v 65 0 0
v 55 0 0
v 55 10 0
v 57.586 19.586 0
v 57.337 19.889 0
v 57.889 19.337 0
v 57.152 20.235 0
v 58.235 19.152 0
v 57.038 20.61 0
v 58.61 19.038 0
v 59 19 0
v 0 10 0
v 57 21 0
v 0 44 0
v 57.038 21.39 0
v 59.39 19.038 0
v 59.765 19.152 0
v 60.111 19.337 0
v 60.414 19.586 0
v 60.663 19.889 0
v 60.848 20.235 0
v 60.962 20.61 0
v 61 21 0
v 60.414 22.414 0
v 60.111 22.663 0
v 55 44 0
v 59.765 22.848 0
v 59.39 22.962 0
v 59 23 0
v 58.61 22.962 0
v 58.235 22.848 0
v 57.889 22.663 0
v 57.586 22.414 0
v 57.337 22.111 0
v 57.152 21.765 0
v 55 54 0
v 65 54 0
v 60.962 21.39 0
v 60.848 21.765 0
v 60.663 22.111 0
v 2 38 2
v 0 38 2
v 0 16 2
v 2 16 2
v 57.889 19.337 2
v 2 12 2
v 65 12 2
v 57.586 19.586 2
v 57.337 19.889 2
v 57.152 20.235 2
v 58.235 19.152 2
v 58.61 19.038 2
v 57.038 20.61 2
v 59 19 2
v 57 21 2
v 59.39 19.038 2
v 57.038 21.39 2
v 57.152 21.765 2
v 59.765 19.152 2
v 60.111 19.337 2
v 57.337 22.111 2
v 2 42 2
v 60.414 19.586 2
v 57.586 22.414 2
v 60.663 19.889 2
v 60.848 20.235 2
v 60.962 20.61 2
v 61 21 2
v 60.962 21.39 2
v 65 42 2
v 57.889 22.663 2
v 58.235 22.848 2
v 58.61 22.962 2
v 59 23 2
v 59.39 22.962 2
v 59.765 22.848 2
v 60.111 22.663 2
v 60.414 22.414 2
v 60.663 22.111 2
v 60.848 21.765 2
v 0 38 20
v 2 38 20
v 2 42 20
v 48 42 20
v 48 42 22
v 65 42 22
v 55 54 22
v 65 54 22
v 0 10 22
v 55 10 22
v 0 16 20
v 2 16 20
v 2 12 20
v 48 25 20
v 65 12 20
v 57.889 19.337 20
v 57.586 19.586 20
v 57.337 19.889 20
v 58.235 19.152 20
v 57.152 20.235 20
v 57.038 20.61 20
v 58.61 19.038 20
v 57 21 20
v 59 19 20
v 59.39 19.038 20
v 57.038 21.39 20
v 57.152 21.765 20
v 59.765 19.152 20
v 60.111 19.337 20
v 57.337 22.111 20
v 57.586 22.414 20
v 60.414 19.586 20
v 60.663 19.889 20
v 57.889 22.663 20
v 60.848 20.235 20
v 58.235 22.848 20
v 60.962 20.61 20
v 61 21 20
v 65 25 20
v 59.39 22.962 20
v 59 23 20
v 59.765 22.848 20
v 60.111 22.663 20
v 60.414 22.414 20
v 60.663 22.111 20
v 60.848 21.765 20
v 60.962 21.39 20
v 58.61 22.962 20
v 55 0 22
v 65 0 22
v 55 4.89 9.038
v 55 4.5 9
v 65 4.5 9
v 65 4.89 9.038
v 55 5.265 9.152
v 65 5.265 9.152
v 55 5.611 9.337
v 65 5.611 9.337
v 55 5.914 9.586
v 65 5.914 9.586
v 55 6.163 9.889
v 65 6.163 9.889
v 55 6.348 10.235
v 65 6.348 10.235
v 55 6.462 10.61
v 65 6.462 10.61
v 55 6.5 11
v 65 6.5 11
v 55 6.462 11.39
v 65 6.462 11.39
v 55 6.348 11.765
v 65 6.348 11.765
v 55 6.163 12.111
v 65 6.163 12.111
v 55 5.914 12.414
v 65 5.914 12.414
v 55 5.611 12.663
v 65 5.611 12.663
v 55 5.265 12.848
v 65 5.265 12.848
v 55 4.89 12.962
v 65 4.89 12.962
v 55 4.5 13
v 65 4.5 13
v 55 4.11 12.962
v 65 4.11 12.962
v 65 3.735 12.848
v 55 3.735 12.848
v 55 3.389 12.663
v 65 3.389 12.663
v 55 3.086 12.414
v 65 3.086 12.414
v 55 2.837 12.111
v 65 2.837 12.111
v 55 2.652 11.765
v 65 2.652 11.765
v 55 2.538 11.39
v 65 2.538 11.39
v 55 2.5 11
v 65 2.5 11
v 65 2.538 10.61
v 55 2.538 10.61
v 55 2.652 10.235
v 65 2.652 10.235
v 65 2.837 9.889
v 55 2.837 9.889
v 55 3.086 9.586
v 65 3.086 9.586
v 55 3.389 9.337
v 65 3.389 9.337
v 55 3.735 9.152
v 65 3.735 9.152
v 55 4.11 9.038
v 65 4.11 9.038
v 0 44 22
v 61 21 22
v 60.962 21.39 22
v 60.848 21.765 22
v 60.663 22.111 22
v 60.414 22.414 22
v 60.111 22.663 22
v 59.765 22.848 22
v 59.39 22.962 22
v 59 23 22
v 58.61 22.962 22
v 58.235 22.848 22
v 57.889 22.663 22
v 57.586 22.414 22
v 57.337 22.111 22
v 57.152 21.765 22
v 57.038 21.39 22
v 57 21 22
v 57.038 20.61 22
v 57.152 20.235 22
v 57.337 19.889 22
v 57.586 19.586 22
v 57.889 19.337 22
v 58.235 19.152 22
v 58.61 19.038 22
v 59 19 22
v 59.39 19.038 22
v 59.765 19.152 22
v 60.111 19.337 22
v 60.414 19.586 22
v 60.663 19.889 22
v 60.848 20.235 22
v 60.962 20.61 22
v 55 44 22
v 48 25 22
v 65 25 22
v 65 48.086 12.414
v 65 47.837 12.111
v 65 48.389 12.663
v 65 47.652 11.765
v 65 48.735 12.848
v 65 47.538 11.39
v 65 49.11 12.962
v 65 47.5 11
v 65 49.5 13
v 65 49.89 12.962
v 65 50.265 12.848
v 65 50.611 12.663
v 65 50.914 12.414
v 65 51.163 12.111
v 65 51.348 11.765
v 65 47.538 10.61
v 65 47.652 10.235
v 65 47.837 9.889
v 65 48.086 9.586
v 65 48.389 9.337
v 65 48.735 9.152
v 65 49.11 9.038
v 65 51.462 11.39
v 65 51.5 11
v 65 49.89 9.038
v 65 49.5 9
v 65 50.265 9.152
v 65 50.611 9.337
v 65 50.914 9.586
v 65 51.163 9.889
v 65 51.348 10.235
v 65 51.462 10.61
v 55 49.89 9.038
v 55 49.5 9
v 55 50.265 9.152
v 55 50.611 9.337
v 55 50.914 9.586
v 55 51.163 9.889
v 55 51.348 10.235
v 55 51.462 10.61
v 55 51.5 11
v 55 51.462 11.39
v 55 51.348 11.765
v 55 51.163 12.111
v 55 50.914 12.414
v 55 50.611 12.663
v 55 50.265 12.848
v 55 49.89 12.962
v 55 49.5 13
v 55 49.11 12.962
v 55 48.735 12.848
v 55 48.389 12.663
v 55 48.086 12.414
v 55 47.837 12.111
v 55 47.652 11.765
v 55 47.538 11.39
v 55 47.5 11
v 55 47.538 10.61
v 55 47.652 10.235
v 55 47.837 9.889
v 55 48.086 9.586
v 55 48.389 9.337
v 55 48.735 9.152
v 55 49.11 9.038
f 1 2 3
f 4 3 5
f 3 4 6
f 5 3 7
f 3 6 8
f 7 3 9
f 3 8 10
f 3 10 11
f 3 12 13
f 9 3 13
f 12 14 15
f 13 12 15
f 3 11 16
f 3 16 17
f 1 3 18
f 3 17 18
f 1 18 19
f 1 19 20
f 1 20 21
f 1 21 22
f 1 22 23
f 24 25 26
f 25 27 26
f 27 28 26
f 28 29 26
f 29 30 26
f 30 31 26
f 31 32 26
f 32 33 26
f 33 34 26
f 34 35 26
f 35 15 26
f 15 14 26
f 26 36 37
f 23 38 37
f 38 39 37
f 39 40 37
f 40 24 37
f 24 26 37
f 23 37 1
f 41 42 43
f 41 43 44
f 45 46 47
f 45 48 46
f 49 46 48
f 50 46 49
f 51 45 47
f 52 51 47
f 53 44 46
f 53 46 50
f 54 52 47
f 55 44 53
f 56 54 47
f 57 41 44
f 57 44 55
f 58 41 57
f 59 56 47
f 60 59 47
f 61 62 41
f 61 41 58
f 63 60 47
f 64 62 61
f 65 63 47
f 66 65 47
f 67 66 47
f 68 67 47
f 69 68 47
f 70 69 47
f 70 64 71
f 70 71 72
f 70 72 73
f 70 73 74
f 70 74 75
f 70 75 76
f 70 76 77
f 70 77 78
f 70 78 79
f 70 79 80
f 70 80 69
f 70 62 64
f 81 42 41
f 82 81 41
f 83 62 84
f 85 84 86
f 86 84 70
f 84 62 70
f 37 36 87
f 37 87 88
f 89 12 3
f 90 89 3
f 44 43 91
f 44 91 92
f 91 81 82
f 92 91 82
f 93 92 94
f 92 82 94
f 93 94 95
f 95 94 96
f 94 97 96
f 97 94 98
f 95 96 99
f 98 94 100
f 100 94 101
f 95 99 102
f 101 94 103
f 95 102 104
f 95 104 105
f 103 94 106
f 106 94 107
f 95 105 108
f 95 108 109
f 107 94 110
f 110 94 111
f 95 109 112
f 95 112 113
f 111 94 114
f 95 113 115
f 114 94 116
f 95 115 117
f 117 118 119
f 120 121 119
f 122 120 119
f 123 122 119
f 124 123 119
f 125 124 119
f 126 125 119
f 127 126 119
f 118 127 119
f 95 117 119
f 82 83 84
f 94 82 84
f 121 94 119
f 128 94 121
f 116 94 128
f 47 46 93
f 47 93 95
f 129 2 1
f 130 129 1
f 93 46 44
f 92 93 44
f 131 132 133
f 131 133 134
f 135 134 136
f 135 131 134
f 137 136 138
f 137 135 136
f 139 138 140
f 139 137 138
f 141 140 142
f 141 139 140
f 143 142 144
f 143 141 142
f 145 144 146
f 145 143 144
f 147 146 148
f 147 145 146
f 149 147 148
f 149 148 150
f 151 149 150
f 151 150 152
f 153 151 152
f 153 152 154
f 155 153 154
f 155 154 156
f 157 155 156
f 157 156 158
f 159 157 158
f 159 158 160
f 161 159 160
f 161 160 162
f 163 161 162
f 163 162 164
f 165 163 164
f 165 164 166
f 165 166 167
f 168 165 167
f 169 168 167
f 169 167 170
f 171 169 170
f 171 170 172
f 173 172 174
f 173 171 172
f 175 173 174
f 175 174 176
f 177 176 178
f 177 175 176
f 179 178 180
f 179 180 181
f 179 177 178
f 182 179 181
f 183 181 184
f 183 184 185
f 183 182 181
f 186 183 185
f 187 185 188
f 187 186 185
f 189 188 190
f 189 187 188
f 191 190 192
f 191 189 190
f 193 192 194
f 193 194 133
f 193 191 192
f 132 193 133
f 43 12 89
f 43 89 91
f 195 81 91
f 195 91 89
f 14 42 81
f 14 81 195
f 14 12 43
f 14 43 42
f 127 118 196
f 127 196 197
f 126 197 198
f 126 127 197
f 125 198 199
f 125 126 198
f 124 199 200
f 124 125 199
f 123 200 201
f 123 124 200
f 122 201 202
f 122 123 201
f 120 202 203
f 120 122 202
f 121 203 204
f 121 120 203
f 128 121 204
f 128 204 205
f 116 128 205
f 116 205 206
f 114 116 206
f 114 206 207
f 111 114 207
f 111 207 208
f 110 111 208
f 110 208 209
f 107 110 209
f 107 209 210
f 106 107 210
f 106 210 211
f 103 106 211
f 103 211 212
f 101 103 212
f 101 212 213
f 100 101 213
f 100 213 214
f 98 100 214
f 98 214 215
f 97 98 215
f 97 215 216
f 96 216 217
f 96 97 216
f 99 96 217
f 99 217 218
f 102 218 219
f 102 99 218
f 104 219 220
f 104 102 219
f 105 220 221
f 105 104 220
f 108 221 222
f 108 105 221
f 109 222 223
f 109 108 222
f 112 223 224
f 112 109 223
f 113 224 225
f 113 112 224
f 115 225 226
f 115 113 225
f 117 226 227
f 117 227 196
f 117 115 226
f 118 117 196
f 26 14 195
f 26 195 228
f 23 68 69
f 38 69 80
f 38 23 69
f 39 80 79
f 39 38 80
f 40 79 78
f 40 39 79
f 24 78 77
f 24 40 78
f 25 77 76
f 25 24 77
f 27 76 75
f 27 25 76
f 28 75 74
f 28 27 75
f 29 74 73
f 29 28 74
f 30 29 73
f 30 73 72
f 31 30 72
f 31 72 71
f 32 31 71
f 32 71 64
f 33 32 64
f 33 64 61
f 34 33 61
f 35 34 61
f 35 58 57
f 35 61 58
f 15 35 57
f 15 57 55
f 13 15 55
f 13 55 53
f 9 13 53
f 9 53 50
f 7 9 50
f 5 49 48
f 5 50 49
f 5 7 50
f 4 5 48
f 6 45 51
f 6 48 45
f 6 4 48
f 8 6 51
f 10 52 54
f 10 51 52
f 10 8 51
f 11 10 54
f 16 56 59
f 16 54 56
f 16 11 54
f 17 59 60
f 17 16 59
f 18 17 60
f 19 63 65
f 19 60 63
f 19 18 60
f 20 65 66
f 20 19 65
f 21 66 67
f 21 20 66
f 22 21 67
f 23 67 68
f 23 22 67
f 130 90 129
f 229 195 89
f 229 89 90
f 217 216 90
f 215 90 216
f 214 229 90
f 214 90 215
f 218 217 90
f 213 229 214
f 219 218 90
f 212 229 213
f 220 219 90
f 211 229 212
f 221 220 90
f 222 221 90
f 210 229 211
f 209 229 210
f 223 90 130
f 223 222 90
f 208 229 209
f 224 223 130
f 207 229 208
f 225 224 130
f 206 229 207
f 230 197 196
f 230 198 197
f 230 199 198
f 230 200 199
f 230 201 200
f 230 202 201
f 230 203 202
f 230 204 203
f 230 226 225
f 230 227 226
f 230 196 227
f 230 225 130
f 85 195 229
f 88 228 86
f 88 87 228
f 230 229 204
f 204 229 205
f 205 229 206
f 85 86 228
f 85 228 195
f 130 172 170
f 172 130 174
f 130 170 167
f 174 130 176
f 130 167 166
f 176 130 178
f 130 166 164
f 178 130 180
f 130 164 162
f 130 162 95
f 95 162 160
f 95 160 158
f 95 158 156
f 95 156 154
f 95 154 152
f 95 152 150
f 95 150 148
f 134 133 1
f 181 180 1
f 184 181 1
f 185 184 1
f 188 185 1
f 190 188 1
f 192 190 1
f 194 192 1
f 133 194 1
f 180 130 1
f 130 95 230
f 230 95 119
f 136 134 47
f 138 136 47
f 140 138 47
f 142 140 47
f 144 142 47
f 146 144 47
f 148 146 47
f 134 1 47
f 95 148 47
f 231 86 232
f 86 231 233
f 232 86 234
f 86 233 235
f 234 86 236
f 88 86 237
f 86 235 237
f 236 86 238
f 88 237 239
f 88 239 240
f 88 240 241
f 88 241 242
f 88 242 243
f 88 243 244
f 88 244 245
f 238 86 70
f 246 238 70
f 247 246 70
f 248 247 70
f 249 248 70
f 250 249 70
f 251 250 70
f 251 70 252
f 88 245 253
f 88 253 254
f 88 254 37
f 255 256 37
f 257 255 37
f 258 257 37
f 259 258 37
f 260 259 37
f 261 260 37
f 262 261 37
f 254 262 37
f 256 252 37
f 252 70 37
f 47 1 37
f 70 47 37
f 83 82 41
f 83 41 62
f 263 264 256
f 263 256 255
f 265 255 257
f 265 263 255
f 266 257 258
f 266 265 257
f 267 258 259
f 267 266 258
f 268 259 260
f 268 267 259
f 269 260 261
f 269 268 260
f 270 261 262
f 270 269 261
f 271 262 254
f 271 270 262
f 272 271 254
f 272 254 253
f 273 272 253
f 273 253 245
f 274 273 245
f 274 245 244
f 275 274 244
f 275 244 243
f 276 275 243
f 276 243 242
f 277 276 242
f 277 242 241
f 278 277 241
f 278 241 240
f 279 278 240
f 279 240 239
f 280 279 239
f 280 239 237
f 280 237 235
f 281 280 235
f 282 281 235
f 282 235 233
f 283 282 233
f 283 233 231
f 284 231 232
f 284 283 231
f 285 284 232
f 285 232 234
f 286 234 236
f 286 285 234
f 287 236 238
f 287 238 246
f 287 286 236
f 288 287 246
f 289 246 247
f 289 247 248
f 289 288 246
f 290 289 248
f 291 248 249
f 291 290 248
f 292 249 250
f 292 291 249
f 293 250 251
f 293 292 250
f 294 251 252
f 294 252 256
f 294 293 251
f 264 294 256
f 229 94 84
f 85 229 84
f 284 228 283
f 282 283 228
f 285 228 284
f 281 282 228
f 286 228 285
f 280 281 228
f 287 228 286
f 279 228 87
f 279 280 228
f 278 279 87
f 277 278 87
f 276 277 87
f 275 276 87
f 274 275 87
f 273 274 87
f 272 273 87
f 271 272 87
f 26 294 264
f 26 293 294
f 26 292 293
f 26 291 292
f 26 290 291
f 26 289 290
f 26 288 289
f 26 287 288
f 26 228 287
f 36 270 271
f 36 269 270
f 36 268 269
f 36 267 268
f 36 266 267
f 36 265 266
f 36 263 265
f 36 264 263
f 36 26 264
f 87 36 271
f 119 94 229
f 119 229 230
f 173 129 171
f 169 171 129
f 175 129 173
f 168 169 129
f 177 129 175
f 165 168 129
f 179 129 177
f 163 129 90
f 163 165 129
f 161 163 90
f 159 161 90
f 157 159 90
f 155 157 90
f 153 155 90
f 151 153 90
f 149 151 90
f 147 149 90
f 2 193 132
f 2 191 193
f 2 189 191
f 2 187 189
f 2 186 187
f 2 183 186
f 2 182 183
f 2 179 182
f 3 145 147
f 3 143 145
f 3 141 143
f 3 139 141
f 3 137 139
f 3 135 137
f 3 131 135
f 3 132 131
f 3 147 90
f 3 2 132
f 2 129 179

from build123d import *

# Parameters (mm, degrees)
BOX003_W          = 63
BOX003_H          = 30
BOX003_DEPTH      = 18
CYLINDER002_R     = 2
CYLINDER002_DEPTH = 22
BOX005_W          = 17
BOX005_H          = 17
BOX005_DEPTH      = 20
BOX004_W          = 65
BOX004_H          = 22
BOX004_DEPTH      = 18
CYLINDER001_R     = 2
CYLINDER001_DEPTH = 65
CYLINDER_R        = 2
CYLINDER_DEPTH    = 65
BOX002_W          = 55
BOX002_H          = 10
BOX002_DEPTH      = 22
BOX001_W          = 55
BOX001_H          = 10
BOX001_DEPTH      = 22
BOX_W             = 65
BOX_H             = 54
BOX_DEPTH         = 22


with BuildPart() as cavitycutout:
    # Box003 → Box003 (new body)
    with BuildSketch(Plane(origin=(2, 12, 2), x_dir=(1, 0, 0), z_dir=(0, 0, 1))):
        with Locations((31.5, 15)):
            Rectangle(BOX003_W, BOX003_H)
    extrude(amount=BOX003_DEPTH)


with BuildPart() as capturescrewhole:
    # Cylinder002 → Cylinder002 (new body)
    with BuildSketch(Plane(origin=(59, 21, 0), x_dir=(1, 0, 0), z_dir=(0, 0, 1))):
        Circle(CYLINDER002_R)
    extrude(amount=CYLINDER002_DEPTH)


with BuildPart() as cutawaynotch:
    # Box005 → Box005 (new body)
    with BuildSketch(Plane(origin=(48, 25, 2), x_dir=(1, 0, 0), z_dir=(0, 0, 1))):
        with Locations((8.5, 8.5)):
            Rectangle(BOX005_W, BOX005_H)
    extrude(amount=BOX005_DEPTH)


with BuildPart() as interiorcut:
    # Box004 → Box004 (new body)
    with BuildSketch(Plane(origin=(0, 16, 2), x_dir=(1, 0, 0), z_dir=(0, 0, 1))):
        with Locations((32.5, 11)):
            Rectangle(BOX004_W, BOX004_H)
    extrude(amount=BOX004_DEPTH)

    # Fusion003: union CavityCutOut, CaptureScrewHole, CutAwayNotch
    add(cavitycutout.part)
    add(capturescrewhole.part)
    add(cutawaynotch.part)


with BuildPart() as righthole:
    # Cylinder001 → Cylinder001 (new body)
    with BuildSketch(Plane(origin=(0, 49.5, 11), x_dir=(0, 0, -1), z_dir=(1, 0, 0))):
        Circle(CYLINDER001_R)
    extrude(amount=CYLINDER001_DEPTH)


with BuildPart() as mountingholes:
    # Cylinder → Cylinder (new body)
    with BuildSketch(Plane(origin=(0, 4.5, 11), x_dir=(0, 0, -1), z_dir=(1, 0, 0))):
        Circle(CYLINDER_R)
    extrude(amount=CYLINDER_DEPTH)

    # Fusion001: union RightHole
    add(righthole.part)


with BuildPart() as rightcut:
    # Box002 → Box002 (new body)
    with BuildSketch(Plane(origin=(0, 44, 0), x_dir=(1, 0, 0), z_dir=(0, 0, 1))):
        with Locations((27.5, 5)):
            Rectangle(BOX002_W, BOX002_H)
    extrude(amount=BOX002_DEPTH)


with BuildPart() as cutoutsandmounting:
    # Box001 → Box001 (new body)
    with BuildSketch(Plane.XY):
        with Locations((27.5, 5)):
            Rectangle(BOX001_W, BOX001_H)
    extrude(amount=BOX001_DEPTH)

    # Fusion: union RightCut
    add(rightcut.part)

    # Fusion002: union MountingHoles
    add(mountingholes.part)


with BuildPart() as ethernetmount:
    # Box → Box (new body)
    with BuildSketch(Plane.XY):
        with Locations((32.5, 27)):
            Rectangle(BOX_W, BOX_H)
    extrude(amount=BOX_DEPTH)

    # Cut: cut CutoutsAndMounting
    add(cutoutsandmounting.part, mode=Mode.SUBTRACT)

    # Cut001: cut InteriorCut
    add(interiorcut.part, mode=Mode.SUBTRACT)


solid = ethernetmount.part
